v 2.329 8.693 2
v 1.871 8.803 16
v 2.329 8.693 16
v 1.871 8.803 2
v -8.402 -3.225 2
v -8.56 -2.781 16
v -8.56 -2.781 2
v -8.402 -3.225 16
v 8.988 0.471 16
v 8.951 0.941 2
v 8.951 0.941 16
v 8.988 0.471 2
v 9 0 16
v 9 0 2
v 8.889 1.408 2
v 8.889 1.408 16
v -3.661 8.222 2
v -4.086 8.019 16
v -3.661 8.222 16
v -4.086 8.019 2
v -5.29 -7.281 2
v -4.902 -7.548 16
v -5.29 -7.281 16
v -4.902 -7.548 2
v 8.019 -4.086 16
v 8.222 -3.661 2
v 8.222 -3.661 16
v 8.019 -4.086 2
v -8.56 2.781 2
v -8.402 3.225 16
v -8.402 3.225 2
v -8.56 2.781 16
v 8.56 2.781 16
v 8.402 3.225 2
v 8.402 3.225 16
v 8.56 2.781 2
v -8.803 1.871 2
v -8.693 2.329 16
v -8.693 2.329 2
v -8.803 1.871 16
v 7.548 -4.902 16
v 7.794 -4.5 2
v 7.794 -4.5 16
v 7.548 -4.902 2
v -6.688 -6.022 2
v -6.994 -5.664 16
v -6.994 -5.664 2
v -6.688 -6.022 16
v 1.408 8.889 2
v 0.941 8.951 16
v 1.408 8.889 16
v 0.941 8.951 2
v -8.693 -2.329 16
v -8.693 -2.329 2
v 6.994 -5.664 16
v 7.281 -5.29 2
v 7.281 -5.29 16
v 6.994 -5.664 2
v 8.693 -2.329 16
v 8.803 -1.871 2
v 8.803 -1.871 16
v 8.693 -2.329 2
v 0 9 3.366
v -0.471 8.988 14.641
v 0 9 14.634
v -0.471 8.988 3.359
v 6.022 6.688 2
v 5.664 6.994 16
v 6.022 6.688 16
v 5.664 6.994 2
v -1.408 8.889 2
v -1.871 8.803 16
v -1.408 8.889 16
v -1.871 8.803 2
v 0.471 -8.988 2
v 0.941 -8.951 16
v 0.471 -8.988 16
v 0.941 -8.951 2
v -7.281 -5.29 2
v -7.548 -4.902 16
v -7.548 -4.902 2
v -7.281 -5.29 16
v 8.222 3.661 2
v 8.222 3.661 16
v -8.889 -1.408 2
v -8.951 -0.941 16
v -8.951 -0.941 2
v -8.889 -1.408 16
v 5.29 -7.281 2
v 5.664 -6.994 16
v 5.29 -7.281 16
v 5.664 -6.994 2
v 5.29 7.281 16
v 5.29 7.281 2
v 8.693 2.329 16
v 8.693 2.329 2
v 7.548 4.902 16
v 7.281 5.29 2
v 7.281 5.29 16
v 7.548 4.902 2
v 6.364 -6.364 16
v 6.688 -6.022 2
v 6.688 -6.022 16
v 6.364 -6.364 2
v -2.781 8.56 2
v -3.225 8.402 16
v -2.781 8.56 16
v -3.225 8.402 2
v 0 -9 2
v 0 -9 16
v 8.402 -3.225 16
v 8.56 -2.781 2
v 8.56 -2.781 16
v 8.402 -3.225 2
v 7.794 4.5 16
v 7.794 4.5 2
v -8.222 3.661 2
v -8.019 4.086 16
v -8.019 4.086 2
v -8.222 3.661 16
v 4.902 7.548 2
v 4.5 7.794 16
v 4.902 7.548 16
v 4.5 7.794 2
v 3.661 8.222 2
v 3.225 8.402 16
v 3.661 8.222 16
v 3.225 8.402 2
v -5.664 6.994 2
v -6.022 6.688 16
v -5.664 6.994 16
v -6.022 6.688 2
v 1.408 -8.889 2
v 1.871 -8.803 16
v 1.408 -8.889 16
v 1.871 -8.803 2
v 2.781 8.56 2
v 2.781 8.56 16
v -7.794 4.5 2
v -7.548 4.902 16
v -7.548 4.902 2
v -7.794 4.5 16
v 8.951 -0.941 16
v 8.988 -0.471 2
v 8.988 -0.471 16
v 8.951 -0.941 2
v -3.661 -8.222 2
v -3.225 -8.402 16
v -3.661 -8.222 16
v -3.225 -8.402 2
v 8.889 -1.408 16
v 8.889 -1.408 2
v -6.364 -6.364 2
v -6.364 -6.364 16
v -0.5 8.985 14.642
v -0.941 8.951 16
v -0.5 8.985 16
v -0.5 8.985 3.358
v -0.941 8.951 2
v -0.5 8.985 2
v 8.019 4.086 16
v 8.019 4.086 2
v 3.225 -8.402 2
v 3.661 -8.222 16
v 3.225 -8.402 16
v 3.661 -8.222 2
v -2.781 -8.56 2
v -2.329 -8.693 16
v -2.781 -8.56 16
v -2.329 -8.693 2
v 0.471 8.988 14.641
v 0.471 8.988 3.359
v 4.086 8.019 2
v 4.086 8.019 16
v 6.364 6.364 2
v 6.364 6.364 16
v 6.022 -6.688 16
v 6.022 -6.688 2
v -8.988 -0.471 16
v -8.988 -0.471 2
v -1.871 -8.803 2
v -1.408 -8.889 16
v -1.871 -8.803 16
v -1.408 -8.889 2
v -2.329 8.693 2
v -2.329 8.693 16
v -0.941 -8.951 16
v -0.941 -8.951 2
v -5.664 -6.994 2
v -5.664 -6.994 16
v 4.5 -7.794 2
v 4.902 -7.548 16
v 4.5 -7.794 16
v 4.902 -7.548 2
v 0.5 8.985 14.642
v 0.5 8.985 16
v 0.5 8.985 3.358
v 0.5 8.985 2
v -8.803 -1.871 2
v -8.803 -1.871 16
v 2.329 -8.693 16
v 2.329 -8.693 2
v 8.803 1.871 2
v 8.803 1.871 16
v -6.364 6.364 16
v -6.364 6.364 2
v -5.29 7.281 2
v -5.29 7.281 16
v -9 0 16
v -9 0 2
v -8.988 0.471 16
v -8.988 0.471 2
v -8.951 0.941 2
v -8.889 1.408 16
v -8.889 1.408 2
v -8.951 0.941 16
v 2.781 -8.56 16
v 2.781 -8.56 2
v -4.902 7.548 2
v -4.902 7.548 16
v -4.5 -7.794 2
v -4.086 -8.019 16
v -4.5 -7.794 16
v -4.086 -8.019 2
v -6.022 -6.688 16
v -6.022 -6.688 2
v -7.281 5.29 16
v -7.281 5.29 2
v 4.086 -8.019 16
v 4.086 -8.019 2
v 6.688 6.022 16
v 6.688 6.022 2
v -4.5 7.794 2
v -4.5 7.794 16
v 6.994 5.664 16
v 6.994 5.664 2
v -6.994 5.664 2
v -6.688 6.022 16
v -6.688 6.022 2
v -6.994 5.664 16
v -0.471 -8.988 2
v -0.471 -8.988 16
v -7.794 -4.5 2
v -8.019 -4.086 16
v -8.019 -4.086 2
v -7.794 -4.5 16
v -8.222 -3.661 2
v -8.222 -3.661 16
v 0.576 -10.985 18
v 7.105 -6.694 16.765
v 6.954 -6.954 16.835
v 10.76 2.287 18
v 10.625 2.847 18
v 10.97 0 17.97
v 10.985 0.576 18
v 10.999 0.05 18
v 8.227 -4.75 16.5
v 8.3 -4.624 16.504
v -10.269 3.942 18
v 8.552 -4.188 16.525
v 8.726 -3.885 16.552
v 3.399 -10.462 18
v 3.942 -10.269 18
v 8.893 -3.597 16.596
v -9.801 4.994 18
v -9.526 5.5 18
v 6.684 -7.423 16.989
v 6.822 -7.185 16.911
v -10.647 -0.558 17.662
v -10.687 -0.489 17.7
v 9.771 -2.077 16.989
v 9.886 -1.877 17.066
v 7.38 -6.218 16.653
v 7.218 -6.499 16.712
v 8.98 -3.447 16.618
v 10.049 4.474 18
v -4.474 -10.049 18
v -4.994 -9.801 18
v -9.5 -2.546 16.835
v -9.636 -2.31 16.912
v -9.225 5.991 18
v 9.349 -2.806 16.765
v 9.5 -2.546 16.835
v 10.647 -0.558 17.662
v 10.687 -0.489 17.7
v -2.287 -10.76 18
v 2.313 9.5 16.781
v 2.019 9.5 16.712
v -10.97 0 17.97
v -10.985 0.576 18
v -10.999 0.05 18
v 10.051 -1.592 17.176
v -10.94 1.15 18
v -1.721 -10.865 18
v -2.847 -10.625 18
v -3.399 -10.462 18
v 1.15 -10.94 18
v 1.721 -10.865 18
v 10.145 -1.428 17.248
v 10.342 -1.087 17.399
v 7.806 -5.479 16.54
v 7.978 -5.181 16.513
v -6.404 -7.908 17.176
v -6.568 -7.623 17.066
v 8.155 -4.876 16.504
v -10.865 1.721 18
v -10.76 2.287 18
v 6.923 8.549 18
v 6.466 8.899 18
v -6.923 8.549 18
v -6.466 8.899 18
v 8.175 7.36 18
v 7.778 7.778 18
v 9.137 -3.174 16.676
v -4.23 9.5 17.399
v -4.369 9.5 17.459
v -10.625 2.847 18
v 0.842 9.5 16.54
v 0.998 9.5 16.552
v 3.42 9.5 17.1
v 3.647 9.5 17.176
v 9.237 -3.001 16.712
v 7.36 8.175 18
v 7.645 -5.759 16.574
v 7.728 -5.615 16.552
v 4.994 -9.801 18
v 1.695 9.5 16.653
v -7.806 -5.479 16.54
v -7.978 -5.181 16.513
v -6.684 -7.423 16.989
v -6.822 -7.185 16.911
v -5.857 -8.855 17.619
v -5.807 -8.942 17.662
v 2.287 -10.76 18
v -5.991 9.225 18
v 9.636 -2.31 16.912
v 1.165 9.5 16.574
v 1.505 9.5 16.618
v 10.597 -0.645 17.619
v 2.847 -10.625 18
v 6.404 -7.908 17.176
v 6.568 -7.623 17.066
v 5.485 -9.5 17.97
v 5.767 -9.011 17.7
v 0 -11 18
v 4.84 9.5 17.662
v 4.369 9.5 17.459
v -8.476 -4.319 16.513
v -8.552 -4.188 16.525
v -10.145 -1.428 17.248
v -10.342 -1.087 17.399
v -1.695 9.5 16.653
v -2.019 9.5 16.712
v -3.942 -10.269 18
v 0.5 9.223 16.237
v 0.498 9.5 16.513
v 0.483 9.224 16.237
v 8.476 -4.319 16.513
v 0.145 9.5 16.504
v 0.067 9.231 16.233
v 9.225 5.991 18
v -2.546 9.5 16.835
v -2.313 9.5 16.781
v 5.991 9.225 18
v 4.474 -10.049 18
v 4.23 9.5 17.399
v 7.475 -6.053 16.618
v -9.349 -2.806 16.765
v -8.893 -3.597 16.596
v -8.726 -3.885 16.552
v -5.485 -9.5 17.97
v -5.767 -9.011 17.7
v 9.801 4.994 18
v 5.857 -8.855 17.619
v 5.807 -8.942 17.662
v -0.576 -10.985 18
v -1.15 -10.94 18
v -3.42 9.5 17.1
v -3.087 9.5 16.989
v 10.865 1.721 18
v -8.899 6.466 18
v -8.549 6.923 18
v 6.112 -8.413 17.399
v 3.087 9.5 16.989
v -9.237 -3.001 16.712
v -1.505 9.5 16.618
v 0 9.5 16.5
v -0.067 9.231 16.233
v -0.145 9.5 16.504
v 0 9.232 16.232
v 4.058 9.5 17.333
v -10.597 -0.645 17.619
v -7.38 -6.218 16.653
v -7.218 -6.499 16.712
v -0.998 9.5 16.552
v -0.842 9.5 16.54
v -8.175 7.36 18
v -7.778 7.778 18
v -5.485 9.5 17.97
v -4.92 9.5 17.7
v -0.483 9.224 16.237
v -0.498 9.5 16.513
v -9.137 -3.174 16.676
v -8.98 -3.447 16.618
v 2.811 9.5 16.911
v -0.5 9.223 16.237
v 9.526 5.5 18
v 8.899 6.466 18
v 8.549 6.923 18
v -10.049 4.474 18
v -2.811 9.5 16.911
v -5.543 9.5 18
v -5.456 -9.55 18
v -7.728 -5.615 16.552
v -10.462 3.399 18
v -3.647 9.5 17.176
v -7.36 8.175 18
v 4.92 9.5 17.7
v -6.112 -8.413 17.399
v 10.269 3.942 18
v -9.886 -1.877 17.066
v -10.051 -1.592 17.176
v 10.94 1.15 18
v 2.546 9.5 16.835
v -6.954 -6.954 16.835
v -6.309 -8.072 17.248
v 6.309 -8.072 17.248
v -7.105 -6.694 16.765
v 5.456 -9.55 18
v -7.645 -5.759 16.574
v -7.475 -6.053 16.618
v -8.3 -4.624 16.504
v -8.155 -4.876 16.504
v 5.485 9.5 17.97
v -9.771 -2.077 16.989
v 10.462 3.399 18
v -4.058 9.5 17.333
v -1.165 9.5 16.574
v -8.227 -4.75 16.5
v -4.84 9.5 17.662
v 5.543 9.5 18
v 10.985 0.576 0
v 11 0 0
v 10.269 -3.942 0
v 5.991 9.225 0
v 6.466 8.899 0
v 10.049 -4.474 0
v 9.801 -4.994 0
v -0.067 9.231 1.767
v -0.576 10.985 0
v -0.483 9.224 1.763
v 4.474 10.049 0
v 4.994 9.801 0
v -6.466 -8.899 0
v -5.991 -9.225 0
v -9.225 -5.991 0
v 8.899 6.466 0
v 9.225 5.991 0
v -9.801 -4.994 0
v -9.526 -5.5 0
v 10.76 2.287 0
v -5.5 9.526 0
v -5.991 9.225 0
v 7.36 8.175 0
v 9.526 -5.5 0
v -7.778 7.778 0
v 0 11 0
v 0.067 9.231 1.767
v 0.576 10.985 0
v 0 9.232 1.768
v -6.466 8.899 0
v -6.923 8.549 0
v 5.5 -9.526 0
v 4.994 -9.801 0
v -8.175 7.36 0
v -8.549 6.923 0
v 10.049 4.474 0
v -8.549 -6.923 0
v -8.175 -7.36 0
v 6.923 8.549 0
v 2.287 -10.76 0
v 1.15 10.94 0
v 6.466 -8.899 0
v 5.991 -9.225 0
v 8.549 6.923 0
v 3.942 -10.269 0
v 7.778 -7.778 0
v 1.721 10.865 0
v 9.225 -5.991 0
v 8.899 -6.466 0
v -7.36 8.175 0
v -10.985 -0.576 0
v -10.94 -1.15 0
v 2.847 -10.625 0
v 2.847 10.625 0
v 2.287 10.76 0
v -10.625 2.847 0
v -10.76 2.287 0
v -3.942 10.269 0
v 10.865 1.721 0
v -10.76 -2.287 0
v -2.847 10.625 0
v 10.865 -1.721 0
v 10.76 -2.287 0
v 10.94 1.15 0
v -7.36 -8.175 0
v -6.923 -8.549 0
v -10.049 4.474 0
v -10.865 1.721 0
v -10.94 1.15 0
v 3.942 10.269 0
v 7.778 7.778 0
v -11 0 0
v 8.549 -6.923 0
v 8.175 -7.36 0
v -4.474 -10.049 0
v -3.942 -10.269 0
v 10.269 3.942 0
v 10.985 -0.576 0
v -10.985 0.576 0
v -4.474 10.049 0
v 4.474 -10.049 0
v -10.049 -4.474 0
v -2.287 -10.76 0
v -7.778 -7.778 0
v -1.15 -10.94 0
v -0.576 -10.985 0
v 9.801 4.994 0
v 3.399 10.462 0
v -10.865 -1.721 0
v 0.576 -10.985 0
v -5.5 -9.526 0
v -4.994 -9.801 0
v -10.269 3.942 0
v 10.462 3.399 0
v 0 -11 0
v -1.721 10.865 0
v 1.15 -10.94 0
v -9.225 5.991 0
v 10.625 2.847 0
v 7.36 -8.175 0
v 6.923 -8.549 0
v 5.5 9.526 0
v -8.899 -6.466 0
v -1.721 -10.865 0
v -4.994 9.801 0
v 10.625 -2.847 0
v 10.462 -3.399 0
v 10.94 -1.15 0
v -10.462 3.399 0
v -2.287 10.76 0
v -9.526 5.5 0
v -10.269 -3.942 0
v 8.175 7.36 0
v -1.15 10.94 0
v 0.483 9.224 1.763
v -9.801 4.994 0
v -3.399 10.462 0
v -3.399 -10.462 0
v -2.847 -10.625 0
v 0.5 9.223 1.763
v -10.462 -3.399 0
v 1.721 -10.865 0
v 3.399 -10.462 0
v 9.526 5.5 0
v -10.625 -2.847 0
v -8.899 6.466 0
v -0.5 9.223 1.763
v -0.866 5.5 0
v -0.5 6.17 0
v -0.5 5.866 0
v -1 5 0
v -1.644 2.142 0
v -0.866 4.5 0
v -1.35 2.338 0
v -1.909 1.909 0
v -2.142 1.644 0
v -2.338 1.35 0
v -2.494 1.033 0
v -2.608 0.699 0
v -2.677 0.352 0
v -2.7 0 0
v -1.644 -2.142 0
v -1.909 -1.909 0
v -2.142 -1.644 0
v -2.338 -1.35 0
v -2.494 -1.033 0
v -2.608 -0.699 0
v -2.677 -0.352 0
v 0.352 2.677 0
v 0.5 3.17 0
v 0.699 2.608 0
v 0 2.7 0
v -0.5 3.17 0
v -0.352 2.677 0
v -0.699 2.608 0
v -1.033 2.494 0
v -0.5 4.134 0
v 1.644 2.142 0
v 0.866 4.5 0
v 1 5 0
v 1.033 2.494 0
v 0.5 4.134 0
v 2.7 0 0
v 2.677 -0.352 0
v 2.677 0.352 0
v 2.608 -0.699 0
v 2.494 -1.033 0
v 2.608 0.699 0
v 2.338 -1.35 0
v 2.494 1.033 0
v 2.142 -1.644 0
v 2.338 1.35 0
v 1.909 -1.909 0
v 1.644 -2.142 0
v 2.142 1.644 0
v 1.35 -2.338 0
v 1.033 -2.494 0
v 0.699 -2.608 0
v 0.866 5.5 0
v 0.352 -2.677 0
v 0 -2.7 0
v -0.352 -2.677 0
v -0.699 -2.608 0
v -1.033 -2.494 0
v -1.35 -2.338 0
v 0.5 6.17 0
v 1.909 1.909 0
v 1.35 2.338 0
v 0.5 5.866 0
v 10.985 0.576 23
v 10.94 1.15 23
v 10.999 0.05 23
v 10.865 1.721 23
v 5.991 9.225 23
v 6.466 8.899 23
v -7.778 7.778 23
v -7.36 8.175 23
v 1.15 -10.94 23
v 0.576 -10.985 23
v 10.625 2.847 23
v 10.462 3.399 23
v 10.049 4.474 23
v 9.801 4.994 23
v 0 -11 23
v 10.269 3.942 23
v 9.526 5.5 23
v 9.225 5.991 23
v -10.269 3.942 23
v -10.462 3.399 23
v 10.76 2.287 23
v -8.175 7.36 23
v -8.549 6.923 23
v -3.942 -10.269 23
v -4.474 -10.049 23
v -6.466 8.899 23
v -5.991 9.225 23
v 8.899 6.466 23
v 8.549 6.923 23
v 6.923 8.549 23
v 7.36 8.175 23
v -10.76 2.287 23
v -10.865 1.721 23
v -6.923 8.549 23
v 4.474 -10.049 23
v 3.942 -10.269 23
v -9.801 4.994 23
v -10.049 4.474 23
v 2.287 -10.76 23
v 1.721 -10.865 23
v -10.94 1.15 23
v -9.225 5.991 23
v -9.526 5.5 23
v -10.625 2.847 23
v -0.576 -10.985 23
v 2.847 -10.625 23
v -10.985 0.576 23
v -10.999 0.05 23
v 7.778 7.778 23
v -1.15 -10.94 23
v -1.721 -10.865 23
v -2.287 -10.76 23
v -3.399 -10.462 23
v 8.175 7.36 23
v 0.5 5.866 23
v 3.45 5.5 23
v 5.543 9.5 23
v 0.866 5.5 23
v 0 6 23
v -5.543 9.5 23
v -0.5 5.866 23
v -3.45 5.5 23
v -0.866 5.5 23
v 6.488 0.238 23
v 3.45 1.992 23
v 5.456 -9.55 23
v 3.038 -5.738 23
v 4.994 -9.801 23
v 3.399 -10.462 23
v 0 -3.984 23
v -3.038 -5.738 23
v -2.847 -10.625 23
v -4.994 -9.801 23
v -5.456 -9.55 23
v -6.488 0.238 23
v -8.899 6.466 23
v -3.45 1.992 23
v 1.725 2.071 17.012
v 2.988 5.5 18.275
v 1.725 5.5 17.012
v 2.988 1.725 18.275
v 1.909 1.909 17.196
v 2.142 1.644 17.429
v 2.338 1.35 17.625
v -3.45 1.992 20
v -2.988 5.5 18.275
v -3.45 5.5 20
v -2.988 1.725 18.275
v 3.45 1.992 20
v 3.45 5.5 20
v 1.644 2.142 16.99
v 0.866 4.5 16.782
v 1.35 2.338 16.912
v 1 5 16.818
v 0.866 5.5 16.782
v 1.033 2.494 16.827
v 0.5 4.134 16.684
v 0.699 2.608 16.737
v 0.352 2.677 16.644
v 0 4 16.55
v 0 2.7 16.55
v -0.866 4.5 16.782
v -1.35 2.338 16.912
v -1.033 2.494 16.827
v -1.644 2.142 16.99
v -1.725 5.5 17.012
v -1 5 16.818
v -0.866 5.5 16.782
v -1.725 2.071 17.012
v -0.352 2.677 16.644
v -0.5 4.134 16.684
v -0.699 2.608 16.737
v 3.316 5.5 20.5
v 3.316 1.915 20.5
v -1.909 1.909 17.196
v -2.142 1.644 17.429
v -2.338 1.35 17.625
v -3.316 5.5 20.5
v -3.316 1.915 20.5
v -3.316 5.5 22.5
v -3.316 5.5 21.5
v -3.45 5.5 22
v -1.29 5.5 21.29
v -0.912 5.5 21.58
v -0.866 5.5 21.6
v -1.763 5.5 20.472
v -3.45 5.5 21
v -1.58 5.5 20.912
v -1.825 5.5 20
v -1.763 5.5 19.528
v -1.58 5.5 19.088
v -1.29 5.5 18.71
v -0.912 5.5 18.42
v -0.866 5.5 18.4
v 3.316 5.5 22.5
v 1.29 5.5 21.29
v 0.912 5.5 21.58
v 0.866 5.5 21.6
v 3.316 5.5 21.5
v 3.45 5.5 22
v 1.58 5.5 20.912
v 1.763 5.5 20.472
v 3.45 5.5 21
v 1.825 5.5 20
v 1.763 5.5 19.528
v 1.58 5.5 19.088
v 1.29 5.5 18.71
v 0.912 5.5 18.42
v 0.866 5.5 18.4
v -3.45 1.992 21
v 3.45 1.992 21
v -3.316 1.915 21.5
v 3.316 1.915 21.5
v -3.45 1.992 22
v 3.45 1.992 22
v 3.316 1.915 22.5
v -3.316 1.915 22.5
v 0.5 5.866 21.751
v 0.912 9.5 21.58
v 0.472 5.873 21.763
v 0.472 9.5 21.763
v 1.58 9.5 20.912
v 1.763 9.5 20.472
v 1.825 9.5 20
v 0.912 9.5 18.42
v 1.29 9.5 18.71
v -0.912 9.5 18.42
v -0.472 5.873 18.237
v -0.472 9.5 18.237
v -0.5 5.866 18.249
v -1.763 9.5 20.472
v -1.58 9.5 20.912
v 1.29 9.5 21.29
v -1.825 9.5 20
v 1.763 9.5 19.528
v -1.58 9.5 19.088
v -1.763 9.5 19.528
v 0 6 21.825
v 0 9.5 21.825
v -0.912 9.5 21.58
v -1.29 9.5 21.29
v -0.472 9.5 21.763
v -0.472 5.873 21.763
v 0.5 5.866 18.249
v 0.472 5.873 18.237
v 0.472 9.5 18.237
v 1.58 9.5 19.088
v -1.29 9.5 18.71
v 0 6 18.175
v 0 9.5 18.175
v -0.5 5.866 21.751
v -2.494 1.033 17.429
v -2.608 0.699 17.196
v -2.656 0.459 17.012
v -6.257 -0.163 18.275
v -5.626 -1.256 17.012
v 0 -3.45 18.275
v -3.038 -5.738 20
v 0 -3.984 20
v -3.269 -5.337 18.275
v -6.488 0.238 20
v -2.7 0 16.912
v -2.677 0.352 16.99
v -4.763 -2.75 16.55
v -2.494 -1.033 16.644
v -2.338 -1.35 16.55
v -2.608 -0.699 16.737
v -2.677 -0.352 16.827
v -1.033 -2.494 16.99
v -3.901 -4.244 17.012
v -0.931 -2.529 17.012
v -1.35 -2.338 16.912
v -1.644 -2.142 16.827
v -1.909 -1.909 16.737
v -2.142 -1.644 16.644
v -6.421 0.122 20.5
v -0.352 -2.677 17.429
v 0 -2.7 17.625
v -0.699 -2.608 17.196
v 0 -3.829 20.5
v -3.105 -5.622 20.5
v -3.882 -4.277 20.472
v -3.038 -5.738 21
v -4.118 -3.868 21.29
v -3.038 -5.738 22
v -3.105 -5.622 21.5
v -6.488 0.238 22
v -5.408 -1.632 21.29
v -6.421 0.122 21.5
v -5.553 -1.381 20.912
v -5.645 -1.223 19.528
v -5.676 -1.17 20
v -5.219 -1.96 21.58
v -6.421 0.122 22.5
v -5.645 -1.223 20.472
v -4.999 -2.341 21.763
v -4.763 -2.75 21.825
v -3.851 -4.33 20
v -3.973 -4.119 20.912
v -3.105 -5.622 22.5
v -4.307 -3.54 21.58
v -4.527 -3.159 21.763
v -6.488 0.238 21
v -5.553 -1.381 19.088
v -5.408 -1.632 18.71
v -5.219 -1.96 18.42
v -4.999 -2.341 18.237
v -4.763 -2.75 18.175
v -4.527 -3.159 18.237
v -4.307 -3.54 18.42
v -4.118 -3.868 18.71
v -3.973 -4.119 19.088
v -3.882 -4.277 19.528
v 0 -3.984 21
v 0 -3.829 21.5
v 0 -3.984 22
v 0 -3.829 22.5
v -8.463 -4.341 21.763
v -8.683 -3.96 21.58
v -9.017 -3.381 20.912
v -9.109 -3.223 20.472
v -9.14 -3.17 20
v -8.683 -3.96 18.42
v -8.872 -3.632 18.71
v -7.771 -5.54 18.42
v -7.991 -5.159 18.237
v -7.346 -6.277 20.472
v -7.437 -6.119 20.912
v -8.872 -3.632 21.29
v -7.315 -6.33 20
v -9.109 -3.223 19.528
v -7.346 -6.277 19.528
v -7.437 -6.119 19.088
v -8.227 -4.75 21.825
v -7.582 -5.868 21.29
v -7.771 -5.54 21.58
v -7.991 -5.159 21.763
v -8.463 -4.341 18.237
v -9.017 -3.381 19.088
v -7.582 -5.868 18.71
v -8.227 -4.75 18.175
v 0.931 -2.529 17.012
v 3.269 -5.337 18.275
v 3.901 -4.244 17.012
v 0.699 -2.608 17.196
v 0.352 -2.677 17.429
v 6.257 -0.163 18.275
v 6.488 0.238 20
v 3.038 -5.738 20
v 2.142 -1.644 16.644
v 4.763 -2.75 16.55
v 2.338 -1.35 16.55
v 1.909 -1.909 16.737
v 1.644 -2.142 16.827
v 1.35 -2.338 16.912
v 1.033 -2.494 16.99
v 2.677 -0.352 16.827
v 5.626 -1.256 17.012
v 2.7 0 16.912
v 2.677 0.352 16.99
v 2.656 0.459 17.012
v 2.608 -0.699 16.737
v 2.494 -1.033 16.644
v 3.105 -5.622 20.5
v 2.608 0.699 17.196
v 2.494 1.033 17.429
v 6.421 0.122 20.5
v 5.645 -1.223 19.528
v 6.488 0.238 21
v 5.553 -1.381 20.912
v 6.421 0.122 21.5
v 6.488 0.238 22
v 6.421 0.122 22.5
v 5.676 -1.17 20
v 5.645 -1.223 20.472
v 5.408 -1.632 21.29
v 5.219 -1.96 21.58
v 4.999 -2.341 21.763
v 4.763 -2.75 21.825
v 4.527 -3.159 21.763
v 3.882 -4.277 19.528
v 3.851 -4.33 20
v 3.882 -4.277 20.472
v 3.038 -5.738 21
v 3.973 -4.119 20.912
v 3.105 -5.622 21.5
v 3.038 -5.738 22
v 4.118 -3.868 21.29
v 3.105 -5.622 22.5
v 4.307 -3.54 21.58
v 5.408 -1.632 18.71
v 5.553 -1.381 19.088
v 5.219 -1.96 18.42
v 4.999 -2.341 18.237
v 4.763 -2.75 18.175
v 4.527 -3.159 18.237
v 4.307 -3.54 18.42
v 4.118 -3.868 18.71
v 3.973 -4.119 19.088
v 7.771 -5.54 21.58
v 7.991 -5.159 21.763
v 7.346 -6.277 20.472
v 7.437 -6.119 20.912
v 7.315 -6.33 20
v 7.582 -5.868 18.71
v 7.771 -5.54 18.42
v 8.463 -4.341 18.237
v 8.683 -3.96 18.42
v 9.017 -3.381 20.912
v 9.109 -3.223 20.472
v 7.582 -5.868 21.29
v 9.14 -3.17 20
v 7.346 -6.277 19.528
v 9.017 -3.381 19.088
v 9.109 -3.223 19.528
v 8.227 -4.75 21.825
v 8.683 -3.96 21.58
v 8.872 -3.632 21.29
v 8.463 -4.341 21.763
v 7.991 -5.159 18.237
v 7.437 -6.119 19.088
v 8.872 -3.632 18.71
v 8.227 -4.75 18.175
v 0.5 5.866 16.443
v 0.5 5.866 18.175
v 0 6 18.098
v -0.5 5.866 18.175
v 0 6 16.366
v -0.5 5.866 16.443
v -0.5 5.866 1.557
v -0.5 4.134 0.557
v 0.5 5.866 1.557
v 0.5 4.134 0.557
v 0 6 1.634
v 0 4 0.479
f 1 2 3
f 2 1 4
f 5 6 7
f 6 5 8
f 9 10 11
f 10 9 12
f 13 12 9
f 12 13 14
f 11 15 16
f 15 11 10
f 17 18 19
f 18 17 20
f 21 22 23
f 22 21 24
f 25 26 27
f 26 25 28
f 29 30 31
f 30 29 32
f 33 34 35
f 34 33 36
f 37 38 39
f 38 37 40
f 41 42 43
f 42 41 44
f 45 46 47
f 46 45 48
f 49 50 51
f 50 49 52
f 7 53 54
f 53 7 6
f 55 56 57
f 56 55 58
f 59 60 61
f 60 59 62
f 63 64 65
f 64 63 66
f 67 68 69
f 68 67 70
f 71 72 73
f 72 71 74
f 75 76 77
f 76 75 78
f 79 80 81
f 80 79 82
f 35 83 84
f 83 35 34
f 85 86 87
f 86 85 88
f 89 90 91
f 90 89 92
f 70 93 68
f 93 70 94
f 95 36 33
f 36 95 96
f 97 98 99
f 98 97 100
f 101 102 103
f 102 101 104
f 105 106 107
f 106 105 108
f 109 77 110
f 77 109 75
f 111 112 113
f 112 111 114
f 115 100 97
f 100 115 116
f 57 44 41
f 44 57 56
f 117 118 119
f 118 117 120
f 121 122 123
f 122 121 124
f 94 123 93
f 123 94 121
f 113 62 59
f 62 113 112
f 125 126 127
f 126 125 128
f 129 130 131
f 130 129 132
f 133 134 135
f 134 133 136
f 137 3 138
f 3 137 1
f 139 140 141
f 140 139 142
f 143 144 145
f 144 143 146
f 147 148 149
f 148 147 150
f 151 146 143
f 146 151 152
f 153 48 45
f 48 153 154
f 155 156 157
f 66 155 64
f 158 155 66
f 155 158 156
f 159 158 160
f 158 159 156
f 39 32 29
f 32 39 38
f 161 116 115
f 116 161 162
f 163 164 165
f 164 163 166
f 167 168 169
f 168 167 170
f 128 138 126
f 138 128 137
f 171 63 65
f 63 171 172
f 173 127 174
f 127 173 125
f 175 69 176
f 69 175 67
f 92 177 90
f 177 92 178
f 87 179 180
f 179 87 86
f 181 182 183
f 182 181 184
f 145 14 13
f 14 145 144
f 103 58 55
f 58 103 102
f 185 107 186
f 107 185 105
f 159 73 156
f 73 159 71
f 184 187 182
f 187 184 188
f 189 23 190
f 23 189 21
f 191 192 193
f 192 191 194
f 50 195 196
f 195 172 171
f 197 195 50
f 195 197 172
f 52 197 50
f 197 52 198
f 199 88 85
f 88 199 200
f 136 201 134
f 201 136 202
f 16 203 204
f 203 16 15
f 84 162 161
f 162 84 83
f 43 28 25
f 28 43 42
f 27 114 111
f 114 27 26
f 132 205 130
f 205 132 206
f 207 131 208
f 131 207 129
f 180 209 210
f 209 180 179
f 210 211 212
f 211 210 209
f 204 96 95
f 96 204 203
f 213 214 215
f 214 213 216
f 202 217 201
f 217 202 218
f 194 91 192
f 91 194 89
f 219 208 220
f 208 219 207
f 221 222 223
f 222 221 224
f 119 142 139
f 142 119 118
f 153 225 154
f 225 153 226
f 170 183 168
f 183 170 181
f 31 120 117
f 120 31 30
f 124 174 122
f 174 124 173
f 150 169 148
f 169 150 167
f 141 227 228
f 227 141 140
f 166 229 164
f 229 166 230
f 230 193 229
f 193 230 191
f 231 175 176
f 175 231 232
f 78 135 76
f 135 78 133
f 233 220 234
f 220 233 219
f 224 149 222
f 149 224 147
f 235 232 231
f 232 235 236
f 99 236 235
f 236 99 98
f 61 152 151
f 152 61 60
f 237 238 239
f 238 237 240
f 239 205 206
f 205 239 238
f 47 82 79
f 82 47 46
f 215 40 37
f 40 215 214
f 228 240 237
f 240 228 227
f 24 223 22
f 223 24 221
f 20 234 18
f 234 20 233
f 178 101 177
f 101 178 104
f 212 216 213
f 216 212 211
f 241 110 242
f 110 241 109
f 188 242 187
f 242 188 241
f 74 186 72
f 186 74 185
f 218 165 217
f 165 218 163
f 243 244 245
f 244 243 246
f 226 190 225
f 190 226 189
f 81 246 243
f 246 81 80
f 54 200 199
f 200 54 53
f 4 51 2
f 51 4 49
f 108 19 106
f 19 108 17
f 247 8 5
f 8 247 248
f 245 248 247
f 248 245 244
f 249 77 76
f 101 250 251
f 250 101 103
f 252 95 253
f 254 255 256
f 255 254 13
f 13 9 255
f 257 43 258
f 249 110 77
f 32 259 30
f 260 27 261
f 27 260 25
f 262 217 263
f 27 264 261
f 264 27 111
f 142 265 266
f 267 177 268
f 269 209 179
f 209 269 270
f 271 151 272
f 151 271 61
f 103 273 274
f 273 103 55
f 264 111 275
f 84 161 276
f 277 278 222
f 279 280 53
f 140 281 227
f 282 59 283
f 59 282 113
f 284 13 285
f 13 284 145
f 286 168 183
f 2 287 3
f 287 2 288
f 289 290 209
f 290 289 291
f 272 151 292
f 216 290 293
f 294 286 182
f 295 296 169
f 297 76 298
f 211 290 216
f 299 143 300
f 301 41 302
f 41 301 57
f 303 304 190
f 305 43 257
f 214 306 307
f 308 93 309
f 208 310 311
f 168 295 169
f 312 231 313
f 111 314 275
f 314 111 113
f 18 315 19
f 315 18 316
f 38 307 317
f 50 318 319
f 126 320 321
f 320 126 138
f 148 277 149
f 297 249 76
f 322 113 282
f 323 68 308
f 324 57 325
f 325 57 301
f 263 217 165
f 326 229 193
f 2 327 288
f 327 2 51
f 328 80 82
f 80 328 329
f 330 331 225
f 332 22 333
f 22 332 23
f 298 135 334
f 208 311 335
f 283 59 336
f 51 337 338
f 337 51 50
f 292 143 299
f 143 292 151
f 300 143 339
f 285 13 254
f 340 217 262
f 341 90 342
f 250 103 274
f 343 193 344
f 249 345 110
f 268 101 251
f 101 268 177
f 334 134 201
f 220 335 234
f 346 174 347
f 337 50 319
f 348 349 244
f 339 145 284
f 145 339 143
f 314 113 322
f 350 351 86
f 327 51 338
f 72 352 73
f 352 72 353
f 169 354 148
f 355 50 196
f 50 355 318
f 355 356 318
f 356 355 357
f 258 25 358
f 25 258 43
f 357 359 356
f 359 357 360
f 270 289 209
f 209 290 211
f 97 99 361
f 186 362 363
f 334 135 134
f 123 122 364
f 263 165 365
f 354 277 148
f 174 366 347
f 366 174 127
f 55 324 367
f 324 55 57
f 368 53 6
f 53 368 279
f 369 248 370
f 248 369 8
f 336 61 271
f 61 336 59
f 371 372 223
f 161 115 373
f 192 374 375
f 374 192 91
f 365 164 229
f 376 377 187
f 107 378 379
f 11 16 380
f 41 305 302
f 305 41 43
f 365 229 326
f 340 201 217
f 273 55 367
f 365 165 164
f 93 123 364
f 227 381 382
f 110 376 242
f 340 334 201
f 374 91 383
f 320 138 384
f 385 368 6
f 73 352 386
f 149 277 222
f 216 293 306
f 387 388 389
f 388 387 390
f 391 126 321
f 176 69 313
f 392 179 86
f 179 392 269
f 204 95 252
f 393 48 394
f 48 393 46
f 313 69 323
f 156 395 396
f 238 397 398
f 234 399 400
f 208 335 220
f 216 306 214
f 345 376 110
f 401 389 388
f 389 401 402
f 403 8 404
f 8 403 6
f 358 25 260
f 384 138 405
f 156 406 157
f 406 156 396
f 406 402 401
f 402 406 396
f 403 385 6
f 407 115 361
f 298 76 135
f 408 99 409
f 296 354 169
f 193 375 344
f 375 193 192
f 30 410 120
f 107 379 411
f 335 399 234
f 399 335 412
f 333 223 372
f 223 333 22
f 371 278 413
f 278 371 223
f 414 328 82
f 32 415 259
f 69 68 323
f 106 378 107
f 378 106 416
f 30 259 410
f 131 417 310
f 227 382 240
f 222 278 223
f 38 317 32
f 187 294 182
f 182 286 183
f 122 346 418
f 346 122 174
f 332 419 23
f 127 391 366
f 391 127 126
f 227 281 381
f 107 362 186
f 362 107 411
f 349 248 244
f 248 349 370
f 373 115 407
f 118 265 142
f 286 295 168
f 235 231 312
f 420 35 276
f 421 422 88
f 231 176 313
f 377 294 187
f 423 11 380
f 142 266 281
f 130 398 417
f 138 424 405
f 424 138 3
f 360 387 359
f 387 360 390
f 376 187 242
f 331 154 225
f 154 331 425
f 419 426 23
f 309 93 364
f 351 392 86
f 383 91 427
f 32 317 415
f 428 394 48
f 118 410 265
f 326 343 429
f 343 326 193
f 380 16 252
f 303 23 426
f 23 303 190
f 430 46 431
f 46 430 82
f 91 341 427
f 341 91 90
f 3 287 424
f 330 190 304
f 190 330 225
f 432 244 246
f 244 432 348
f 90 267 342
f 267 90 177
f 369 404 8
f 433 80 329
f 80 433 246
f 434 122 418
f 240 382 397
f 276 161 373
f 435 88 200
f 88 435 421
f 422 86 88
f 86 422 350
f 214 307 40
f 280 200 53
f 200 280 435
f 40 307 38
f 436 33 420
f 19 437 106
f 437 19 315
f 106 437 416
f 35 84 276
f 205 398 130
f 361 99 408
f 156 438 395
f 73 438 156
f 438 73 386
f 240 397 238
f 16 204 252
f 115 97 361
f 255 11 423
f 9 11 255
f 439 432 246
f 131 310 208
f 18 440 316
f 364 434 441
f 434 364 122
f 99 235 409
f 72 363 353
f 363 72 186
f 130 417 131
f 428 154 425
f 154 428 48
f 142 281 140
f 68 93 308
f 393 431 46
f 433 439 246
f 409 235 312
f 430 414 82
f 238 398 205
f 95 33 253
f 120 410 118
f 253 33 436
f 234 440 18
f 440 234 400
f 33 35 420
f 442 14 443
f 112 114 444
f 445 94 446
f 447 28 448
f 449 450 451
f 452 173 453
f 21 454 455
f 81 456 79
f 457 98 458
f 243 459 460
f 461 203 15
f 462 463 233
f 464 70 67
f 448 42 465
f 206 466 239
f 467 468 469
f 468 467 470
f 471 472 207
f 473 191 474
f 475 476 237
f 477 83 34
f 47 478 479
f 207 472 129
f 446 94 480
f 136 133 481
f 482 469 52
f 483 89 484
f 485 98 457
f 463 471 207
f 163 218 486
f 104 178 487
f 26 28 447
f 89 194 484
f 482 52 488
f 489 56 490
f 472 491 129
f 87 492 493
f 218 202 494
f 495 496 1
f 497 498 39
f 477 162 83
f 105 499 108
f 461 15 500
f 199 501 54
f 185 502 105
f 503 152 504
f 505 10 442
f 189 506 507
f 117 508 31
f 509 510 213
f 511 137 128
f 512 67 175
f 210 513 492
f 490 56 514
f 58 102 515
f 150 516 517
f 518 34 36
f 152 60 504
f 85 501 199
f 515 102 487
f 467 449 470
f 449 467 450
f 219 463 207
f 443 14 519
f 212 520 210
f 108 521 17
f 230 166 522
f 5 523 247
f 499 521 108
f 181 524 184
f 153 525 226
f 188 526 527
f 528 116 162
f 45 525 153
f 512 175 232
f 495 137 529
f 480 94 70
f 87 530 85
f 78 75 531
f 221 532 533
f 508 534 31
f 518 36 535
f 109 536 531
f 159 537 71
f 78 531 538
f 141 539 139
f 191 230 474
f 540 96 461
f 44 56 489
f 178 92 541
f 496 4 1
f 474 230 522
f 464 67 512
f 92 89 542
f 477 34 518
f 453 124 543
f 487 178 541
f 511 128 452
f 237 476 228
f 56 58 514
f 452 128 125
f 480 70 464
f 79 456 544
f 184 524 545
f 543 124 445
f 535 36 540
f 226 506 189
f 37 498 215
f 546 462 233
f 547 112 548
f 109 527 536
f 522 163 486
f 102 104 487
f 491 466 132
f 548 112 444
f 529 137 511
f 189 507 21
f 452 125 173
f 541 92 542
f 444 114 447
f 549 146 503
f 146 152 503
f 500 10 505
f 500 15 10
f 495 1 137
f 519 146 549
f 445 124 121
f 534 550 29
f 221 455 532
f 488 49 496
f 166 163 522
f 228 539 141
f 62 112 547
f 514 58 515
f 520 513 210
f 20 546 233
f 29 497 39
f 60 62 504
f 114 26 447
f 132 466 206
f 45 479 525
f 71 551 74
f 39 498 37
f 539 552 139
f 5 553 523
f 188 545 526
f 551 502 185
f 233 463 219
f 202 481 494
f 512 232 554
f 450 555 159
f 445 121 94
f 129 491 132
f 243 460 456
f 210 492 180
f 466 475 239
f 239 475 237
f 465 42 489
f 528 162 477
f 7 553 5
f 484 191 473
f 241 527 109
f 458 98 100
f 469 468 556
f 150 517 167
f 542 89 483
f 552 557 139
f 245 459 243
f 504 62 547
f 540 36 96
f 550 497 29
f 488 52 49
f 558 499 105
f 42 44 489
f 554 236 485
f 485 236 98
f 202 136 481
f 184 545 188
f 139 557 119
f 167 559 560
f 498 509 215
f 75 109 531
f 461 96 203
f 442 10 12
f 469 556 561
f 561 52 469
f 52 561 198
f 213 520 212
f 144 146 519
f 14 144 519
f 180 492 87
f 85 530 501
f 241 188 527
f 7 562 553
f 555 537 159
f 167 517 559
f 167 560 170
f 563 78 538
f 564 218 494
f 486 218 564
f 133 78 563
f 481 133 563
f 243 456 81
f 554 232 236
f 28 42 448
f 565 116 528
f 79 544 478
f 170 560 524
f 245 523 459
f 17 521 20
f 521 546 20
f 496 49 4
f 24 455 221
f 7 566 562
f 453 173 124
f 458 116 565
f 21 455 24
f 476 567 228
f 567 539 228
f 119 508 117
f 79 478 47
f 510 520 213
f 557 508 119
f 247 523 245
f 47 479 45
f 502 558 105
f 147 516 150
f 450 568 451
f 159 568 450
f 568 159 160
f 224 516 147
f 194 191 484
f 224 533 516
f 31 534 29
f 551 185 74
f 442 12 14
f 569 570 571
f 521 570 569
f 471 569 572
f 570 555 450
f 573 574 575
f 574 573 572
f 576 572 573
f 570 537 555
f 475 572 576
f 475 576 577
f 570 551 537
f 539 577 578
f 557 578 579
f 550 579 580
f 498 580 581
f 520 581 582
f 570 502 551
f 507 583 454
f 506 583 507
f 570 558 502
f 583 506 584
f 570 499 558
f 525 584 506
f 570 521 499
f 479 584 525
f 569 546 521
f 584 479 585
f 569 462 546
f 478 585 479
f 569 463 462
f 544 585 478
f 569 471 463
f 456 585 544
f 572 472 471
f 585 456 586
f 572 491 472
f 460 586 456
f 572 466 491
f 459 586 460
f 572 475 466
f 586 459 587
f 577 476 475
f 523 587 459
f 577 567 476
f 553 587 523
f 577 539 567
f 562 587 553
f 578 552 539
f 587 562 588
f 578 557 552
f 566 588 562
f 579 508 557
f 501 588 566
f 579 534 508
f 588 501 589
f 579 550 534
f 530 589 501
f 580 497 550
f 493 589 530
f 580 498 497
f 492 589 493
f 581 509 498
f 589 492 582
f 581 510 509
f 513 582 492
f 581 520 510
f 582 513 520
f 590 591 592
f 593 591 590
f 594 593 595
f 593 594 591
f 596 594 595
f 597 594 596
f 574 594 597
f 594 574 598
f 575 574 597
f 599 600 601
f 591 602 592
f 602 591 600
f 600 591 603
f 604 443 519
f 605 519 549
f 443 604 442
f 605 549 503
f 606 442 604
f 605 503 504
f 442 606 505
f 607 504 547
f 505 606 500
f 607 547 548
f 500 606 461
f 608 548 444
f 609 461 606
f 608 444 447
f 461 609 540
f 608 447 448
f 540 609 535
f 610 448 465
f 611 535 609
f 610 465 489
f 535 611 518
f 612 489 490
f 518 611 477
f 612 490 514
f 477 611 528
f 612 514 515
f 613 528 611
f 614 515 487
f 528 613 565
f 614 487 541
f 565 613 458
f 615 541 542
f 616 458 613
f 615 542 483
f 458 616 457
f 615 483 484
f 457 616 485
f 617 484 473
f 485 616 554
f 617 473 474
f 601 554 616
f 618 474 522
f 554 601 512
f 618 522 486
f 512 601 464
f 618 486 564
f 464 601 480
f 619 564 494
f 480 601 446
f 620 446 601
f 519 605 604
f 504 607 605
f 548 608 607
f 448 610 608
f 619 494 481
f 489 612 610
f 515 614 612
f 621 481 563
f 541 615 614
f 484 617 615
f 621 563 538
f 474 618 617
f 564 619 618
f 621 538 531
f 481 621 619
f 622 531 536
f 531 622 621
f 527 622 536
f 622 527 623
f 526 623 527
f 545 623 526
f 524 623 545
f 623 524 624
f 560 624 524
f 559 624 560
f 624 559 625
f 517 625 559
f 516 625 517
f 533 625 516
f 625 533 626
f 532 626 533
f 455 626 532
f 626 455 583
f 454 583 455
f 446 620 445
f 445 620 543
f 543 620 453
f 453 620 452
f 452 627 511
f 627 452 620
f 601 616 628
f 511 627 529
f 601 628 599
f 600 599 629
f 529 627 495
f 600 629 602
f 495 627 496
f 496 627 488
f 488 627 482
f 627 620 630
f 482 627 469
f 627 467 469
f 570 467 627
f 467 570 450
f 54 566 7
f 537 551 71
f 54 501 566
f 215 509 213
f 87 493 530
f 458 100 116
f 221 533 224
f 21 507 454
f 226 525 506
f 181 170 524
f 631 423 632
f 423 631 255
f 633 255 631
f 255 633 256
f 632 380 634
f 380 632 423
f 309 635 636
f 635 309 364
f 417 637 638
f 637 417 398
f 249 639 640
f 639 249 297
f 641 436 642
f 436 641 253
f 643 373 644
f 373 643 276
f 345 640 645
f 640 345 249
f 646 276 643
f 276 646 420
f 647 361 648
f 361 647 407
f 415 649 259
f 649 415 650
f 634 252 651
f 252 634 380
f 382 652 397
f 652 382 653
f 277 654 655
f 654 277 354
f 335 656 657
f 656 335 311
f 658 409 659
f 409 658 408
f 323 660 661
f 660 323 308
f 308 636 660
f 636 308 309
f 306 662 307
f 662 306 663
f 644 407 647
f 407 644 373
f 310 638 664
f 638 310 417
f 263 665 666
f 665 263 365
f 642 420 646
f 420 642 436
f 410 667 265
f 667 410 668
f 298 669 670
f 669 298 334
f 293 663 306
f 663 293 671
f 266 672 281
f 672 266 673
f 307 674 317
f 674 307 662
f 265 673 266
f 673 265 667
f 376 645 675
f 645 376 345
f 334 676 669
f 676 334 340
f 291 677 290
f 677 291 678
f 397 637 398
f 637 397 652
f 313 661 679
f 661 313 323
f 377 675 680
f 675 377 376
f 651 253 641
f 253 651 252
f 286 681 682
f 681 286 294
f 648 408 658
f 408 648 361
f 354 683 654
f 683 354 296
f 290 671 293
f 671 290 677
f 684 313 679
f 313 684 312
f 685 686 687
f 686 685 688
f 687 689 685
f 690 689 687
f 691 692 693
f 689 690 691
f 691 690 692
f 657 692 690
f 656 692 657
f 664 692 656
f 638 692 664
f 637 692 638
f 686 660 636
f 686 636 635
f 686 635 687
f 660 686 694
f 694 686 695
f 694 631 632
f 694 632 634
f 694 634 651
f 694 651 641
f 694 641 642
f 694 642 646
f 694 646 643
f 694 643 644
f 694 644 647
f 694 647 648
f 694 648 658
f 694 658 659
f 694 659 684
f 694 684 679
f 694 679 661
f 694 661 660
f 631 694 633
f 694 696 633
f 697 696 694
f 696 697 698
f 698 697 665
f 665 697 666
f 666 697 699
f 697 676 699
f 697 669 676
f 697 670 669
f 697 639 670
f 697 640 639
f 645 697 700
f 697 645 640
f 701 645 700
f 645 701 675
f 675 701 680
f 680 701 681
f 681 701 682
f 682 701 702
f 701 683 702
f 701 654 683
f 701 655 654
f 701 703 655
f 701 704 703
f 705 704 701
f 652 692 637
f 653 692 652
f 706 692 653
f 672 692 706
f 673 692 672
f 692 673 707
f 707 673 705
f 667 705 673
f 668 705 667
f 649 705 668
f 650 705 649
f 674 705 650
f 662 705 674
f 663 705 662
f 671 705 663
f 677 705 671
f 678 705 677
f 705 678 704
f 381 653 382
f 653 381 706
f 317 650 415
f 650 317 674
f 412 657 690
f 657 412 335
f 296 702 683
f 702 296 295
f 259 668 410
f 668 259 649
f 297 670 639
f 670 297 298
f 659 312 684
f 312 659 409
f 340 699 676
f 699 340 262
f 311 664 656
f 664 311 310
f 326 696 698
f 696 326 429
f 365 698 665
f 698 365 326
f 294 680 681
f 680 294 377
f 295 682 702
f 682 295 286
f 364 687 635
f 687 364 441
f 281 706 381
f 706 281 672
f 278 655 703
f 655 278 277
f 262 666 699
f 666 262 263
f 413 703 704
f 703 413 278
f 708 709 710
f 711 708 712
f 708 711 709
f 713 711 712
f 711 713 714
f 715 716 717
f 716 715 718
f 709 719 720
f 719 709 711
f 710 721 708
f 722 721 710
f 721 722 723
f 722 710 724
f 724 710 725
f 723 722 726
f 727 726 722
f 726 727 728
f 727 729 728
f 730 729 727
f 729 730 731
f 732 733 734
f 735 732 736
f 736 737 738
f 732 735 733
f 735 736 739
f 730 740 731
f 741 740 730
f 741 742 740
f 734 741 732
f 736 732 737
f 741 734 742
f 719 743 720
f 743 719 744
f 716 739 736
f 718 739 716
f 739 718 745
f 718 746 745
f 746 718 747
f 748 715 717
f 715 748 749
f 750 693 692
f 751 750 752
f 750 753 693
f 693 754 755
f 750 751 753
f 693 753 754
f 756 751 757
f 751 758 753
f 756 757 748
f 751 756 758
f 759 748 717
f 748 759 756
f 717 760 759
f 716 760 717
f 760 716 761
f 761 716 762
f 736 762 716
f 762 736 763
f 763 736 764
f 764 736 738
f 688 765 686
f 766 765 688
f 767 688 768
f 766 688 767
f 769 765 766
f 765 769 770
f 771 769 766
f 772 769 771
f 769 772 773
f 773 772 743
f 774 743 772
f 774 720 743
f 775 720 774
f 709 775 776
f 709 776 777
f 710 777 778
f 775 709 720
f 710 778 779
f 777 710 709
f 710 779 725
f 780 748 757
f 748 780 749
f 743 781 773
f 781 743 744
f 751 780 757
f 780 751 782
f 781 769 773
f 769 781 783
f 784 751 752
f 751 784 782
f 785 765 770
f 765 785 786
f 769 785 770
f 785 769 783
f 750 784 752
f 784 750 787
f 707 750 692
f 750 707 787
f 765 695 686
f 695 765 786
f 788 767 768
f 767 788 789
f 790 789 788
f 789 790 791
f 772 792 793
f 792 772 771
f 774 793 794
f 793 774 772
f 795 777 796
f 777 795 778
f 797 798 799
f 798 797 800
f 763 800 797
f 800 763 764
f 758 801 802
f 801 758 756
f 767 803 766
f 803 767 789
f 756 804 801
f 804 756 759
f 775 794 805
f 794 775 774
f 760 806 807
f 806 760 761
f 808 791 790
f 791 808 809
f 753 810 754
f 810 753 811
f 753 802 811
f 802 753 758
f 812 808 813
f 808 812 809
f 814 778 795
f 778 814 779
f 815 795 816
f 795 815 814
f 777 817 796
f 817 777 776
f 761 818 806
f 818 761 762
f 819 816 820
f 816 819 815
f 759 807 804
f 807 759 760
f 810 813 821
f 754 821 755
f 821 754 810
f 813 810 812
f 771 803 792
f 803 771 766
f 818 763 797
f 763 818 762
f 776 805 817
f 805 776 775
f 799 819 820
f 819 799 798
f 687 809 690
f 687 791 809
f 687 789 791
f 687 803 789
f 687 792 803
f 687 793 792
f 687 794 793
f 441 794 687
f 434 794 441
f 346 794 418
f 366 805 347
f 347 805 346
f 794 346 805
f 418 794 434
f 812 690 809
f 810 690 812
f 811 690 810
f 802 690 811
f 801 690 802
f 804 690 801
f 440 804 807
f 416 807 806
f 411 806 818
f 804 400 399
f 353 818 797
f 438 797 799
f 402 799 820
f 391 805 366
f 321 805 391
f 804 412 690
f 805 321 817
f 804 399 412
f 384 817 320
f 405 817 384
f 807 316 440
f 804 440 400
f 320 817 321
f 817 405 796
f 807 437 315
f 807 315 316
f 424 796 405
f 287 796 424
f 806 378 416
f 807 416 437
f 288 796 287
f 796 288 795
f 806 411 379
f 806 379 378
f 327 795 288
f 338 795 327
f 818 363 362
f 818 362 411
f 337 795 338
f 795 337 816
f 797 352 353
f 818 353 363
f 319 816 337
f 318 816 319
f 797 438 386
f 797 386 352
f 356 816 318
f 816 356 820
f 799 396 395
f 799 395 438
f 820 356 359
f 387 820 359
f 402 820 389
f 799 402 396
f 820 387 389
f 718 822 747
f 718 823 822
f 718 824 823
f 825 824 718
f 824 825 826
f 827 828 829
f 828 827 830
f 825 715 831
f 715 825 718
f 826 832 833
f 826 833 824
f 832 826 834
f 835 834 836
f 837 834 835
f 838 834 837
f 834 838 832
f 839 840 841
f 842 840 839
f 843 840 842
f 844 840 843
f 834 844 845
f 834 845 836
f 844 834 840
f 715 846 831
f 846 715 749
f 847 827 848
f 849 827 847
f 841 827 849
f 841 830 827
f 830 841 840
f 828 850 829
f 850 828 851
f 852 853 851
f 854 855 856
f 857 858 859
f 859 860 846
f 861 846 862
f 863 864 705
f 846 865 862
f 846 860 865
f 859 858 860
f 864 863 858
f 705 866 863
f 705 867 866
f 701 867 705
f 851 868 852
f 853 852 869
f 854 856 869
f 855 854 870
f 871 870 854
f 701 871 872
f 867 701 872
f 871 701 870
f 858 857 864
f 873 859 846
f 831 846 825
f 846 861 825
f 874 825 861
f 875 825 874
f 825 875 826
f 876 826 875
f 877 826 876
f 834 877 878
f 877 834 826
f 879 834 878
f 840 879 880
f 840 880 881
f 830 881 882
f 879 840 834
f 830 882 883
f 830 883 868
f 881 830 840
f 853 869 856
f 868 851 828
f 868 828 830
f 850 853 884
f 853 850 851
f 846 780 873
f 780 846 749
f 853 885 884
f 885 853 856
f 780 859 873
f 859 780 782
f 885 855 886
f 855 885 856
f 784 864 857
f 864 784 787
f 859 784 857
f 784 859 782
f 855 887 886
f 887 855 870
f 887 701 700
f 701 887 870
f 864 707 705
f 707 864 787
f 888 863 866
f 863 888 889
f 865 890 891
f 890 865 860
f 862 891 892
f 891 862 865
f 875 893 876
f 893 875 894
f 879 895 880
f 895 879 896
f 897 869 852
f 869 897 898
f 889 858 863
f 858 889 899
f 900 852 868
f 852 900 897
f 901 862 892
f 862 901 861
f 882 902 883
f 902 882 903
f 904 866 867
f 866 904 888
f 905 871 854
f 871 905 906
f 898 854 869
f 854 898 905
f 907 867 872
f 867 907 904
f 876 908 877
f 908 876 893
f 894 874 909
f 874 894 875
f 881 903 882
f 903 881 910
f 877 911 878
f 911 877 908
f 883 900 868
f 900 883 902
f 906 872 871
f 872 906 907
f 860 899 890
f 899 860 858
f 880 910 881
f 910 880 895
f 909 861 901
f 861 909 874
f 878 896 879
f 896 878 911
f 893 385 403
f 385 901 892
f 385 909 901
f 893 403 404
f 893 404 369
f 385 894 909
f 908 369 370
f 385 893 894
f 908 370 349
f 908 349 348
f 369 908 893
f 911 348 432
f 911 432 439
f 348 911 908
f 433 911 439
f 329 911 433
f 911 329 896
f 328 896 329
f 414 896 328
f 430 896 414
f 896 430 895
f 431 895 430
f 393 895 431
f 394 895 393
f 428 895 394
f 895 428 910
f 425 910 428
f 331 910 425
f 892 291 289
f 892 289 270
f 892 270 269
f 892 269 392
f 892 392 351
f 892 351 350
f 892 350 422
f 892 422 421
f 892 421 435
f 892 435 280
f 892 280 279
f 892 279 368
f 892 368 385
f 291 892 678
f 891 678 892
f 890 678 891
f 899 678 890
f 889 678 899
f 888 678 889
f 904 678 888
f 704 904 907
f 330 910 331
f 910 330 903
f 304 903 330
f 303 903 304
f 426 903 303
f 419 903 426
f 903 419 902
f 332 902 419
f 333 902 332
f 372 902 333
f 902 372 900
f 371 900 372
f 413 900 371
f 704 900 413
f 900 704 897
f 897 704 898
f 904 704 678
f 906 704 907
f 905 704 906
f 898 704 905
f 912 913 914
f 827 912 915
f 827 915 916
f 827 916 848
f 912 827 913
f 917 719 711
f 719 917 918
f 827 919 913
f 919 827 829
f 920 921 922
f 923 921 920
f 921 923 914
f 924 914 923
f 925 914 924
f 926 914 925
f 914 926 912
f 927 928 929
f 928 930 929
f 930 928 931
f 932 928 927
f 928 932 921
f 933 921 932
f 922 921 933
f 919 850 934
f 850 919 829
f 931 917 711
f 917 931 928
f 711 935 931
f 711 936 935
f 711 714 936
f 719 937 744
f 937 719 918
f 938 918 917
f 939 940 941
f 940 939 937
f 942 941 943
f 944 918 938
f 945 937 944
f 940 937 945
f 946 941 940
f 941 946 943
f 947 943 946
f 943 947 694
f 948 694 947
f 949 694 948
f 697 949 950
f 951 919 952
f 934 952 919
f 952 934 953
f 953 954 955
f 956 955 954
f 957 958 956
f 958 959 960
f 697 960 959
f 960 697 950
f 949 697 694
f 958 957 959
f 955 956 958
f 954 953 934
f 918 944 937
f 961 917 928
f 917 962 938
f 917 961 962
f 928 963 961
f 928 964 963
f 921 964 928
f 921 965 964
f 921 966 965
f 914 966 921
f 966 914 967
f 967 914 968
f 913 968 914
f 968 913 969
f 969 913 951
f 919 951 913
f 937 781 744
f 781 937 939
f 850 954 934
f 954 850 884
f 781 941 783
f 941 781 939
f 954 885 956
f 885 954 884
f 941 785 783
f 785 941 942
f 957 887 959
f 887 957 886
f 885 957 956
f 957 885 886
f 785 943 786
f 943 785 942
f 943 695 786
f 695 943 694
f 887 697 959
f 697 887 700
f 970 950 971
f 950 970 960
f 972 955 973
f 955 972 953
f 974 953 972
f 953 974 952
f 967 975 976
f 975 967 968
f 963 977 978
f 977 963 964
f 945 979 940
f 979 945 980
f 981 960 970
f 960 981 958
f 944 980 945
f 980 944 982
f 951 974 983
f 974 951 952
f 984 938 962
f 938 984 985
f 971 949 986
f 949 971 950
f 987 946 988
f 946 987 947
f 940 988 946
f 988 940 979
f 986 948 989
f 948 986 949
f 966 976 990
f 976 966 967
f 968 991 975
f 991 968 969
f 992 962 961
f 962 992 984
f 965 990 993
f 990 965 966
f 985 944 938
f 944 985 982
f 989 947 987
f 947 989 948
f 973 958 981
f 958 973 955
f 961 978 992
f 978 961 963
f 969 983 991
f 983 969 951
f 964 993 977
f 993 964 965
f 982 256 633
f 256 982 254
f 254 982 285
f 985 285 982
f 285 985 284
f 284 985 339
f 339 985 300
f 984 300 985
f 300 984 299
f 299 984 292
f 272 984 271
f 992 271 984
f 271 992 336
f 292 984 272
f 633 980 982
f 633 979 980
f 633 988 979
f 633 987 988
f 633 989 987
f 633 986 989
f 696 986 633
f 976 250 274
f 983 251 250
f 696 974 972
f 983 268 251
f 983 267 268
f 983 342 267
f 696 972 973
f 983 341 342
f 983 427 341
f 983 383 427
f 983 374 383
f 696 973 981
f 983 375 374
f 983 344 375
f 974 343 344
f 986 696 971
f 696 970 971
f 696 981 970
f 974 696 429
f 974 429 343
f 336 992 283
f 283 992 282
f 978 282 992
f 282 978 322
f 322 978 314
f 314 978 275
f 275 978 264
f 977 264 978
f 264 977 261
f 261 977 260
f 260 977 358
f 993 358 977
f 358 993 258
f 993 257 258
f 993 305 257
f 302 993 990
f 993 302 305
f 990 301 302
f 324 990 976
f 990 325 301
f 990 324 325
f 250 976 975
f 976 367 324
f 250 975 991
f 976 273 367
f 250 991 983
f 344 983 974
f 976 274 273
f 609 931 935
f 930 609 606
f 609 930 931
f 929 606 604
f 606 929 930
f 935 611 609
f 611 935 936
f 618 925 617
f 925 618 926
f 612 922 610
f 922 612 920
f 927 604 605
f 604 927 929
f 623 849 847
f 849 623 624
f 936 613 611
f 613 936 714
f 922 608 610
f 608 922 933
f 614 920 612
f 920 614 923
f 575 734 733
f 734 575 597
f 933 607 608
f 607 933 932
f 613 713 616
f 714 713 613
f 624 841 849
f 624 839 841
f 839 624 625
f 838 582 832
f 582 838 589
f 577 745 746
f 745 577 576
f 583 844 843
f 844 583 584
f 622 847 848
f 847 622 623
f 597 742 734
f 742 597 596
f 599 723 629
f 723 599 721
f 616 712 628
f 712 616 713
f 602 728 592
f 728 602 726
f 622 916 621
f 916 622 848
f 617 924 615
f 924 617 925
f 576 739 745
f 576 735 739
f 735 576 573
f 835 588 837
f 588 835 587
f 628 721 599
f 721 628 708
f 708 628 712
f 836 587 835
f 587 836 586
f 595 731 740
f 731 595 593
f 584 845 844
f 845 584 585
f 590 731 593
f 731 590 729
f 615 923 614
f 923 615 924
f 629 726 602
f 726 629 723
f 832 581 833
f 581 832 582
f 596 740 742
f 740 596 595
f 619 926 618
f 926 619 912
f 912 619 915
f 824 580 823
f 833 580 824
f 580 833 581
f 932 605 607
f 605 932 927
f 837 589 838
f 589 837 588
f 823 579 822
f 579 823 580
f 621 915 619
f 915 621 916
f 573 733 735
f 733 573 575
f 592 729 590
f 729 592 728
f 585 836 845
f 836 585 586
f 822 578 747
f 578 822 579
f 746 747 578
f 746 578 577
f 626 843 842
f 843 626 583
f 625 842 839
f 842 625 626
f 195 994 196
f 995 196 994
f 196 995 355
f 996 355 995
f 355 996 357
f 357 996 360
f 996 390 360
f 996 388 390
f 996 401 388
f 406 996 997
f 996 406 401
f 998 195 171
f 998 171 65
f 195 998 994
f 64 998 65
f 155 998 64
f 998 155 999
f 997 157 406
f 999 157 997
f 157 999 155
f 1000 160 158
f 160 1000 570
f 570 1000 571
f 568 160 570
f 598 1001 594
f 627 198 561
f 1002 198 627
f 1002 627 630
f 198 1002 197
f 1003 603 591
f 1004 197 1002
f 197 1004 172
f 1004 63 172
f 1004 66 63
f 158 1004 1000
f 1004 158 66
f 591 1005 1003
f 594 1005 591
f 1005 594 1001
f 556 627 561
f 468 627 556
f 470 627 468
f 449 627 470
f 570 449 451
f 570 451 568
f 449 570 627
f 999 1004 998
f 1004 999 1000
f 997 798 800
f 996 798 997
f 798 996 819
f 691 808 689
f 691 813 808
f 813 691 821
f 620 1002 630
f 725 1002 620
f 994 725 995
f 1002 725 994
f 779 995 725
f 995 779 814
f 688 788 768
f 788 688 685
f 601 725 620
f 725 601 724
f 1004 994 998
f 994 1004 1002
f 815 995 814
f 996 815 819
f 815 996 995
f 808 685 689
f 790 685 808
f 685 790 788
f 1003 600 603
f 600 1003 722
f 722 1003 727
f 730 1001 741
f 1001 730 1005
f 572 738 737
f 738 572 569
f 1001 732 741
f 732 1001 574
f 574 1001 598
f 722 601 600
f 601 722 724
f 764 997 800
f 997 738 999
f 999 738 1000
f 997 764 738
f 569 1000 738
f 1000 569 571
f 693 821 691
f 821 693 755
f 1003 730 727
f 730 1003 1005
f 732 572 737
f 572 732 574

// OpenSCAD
// file: configuration.scad
// Increase this if your slicer or printer make holes too tight.
extra_radius = 0.2;

// OD = outside diameter, corner to corner.
m3_nut_od = 6.1;
m3_nut_radius = m3_nut_od/2 + 0.2 + extra_radius;

// Major diameter of metric 3mm thread.
m3_major = 2.85;
m3_radius = m3_major/2 + extra_radius;
m3_wide_radius = m3_major/2 + 0.2 + extra_radius;

// NEMA17 stepper motors.
motor_shaft_diameter = 5;
motor_shaft_radius = motor_shaft_diameter/2 + extra_radius;

// Frame brackets.
thickness = 3.6;
// main file
include <configuration.scad>;

radius = 9;
width = 16;
top = 5;
smoothness = 120;

module spool() {
  difference() {
    union() {
      cylinder(r=radius, h=width, center=true, $fn=smoothness);
      translate([0, 0, width/2])
	cylinder(r1=radius, r2=radius+2, h=2, center=true, $fn=smoothness);
      translate([0, 0, -width/2])
	cylinder(r2=radius, r1=radius+2, h=2, center=true, $fn=smoothness);
      translate([0, 0, width/2+top/2+1])
	cylinder(r=radius+2, h=top, center=true, $fn=smoothness);
    }
    // Motor shaft.
    cylinder(r=motor_shaft_radius, h=50, center=true, $fn=48);
    // Filament tunnels.
    translate([0, radius, width/2-1.5]) rotate([-30, 0, 0])
      #cube([1, 2*radius, 1.5], center=true);
    translate([0, radius, -width/2+1.5]) rotate([30, 0, 0])
      #cube([1, 2*radius, 1.5], center=true);
    translate([0, 5, 0])
      #cylinder(r=1, h=40, center=true, $fn=12);
    // M3 screws and nuts on three sides.
    for (a = [0:120:359]) {
      rotate([0, 0, a]) translate([0, 4.5, width/2+3]) rotate([90, 0, 0]) {
	cylinder(r=m3_wide_radius, h=radius+5, center=true, $fn=24);
	translate([0, 0, 1-radius]) cylinder(r=10, h=6, center=true);
	for (z = [0:10]) {
	  translate([0, z, 1.5]) rotate([0, 0, 30])
	    cylinder(r=m3_nut_radius, h=5, center=true, $fn=12);
	}
      }
    }
  }
}

translate([0, 0, width/2+1]) spool();
